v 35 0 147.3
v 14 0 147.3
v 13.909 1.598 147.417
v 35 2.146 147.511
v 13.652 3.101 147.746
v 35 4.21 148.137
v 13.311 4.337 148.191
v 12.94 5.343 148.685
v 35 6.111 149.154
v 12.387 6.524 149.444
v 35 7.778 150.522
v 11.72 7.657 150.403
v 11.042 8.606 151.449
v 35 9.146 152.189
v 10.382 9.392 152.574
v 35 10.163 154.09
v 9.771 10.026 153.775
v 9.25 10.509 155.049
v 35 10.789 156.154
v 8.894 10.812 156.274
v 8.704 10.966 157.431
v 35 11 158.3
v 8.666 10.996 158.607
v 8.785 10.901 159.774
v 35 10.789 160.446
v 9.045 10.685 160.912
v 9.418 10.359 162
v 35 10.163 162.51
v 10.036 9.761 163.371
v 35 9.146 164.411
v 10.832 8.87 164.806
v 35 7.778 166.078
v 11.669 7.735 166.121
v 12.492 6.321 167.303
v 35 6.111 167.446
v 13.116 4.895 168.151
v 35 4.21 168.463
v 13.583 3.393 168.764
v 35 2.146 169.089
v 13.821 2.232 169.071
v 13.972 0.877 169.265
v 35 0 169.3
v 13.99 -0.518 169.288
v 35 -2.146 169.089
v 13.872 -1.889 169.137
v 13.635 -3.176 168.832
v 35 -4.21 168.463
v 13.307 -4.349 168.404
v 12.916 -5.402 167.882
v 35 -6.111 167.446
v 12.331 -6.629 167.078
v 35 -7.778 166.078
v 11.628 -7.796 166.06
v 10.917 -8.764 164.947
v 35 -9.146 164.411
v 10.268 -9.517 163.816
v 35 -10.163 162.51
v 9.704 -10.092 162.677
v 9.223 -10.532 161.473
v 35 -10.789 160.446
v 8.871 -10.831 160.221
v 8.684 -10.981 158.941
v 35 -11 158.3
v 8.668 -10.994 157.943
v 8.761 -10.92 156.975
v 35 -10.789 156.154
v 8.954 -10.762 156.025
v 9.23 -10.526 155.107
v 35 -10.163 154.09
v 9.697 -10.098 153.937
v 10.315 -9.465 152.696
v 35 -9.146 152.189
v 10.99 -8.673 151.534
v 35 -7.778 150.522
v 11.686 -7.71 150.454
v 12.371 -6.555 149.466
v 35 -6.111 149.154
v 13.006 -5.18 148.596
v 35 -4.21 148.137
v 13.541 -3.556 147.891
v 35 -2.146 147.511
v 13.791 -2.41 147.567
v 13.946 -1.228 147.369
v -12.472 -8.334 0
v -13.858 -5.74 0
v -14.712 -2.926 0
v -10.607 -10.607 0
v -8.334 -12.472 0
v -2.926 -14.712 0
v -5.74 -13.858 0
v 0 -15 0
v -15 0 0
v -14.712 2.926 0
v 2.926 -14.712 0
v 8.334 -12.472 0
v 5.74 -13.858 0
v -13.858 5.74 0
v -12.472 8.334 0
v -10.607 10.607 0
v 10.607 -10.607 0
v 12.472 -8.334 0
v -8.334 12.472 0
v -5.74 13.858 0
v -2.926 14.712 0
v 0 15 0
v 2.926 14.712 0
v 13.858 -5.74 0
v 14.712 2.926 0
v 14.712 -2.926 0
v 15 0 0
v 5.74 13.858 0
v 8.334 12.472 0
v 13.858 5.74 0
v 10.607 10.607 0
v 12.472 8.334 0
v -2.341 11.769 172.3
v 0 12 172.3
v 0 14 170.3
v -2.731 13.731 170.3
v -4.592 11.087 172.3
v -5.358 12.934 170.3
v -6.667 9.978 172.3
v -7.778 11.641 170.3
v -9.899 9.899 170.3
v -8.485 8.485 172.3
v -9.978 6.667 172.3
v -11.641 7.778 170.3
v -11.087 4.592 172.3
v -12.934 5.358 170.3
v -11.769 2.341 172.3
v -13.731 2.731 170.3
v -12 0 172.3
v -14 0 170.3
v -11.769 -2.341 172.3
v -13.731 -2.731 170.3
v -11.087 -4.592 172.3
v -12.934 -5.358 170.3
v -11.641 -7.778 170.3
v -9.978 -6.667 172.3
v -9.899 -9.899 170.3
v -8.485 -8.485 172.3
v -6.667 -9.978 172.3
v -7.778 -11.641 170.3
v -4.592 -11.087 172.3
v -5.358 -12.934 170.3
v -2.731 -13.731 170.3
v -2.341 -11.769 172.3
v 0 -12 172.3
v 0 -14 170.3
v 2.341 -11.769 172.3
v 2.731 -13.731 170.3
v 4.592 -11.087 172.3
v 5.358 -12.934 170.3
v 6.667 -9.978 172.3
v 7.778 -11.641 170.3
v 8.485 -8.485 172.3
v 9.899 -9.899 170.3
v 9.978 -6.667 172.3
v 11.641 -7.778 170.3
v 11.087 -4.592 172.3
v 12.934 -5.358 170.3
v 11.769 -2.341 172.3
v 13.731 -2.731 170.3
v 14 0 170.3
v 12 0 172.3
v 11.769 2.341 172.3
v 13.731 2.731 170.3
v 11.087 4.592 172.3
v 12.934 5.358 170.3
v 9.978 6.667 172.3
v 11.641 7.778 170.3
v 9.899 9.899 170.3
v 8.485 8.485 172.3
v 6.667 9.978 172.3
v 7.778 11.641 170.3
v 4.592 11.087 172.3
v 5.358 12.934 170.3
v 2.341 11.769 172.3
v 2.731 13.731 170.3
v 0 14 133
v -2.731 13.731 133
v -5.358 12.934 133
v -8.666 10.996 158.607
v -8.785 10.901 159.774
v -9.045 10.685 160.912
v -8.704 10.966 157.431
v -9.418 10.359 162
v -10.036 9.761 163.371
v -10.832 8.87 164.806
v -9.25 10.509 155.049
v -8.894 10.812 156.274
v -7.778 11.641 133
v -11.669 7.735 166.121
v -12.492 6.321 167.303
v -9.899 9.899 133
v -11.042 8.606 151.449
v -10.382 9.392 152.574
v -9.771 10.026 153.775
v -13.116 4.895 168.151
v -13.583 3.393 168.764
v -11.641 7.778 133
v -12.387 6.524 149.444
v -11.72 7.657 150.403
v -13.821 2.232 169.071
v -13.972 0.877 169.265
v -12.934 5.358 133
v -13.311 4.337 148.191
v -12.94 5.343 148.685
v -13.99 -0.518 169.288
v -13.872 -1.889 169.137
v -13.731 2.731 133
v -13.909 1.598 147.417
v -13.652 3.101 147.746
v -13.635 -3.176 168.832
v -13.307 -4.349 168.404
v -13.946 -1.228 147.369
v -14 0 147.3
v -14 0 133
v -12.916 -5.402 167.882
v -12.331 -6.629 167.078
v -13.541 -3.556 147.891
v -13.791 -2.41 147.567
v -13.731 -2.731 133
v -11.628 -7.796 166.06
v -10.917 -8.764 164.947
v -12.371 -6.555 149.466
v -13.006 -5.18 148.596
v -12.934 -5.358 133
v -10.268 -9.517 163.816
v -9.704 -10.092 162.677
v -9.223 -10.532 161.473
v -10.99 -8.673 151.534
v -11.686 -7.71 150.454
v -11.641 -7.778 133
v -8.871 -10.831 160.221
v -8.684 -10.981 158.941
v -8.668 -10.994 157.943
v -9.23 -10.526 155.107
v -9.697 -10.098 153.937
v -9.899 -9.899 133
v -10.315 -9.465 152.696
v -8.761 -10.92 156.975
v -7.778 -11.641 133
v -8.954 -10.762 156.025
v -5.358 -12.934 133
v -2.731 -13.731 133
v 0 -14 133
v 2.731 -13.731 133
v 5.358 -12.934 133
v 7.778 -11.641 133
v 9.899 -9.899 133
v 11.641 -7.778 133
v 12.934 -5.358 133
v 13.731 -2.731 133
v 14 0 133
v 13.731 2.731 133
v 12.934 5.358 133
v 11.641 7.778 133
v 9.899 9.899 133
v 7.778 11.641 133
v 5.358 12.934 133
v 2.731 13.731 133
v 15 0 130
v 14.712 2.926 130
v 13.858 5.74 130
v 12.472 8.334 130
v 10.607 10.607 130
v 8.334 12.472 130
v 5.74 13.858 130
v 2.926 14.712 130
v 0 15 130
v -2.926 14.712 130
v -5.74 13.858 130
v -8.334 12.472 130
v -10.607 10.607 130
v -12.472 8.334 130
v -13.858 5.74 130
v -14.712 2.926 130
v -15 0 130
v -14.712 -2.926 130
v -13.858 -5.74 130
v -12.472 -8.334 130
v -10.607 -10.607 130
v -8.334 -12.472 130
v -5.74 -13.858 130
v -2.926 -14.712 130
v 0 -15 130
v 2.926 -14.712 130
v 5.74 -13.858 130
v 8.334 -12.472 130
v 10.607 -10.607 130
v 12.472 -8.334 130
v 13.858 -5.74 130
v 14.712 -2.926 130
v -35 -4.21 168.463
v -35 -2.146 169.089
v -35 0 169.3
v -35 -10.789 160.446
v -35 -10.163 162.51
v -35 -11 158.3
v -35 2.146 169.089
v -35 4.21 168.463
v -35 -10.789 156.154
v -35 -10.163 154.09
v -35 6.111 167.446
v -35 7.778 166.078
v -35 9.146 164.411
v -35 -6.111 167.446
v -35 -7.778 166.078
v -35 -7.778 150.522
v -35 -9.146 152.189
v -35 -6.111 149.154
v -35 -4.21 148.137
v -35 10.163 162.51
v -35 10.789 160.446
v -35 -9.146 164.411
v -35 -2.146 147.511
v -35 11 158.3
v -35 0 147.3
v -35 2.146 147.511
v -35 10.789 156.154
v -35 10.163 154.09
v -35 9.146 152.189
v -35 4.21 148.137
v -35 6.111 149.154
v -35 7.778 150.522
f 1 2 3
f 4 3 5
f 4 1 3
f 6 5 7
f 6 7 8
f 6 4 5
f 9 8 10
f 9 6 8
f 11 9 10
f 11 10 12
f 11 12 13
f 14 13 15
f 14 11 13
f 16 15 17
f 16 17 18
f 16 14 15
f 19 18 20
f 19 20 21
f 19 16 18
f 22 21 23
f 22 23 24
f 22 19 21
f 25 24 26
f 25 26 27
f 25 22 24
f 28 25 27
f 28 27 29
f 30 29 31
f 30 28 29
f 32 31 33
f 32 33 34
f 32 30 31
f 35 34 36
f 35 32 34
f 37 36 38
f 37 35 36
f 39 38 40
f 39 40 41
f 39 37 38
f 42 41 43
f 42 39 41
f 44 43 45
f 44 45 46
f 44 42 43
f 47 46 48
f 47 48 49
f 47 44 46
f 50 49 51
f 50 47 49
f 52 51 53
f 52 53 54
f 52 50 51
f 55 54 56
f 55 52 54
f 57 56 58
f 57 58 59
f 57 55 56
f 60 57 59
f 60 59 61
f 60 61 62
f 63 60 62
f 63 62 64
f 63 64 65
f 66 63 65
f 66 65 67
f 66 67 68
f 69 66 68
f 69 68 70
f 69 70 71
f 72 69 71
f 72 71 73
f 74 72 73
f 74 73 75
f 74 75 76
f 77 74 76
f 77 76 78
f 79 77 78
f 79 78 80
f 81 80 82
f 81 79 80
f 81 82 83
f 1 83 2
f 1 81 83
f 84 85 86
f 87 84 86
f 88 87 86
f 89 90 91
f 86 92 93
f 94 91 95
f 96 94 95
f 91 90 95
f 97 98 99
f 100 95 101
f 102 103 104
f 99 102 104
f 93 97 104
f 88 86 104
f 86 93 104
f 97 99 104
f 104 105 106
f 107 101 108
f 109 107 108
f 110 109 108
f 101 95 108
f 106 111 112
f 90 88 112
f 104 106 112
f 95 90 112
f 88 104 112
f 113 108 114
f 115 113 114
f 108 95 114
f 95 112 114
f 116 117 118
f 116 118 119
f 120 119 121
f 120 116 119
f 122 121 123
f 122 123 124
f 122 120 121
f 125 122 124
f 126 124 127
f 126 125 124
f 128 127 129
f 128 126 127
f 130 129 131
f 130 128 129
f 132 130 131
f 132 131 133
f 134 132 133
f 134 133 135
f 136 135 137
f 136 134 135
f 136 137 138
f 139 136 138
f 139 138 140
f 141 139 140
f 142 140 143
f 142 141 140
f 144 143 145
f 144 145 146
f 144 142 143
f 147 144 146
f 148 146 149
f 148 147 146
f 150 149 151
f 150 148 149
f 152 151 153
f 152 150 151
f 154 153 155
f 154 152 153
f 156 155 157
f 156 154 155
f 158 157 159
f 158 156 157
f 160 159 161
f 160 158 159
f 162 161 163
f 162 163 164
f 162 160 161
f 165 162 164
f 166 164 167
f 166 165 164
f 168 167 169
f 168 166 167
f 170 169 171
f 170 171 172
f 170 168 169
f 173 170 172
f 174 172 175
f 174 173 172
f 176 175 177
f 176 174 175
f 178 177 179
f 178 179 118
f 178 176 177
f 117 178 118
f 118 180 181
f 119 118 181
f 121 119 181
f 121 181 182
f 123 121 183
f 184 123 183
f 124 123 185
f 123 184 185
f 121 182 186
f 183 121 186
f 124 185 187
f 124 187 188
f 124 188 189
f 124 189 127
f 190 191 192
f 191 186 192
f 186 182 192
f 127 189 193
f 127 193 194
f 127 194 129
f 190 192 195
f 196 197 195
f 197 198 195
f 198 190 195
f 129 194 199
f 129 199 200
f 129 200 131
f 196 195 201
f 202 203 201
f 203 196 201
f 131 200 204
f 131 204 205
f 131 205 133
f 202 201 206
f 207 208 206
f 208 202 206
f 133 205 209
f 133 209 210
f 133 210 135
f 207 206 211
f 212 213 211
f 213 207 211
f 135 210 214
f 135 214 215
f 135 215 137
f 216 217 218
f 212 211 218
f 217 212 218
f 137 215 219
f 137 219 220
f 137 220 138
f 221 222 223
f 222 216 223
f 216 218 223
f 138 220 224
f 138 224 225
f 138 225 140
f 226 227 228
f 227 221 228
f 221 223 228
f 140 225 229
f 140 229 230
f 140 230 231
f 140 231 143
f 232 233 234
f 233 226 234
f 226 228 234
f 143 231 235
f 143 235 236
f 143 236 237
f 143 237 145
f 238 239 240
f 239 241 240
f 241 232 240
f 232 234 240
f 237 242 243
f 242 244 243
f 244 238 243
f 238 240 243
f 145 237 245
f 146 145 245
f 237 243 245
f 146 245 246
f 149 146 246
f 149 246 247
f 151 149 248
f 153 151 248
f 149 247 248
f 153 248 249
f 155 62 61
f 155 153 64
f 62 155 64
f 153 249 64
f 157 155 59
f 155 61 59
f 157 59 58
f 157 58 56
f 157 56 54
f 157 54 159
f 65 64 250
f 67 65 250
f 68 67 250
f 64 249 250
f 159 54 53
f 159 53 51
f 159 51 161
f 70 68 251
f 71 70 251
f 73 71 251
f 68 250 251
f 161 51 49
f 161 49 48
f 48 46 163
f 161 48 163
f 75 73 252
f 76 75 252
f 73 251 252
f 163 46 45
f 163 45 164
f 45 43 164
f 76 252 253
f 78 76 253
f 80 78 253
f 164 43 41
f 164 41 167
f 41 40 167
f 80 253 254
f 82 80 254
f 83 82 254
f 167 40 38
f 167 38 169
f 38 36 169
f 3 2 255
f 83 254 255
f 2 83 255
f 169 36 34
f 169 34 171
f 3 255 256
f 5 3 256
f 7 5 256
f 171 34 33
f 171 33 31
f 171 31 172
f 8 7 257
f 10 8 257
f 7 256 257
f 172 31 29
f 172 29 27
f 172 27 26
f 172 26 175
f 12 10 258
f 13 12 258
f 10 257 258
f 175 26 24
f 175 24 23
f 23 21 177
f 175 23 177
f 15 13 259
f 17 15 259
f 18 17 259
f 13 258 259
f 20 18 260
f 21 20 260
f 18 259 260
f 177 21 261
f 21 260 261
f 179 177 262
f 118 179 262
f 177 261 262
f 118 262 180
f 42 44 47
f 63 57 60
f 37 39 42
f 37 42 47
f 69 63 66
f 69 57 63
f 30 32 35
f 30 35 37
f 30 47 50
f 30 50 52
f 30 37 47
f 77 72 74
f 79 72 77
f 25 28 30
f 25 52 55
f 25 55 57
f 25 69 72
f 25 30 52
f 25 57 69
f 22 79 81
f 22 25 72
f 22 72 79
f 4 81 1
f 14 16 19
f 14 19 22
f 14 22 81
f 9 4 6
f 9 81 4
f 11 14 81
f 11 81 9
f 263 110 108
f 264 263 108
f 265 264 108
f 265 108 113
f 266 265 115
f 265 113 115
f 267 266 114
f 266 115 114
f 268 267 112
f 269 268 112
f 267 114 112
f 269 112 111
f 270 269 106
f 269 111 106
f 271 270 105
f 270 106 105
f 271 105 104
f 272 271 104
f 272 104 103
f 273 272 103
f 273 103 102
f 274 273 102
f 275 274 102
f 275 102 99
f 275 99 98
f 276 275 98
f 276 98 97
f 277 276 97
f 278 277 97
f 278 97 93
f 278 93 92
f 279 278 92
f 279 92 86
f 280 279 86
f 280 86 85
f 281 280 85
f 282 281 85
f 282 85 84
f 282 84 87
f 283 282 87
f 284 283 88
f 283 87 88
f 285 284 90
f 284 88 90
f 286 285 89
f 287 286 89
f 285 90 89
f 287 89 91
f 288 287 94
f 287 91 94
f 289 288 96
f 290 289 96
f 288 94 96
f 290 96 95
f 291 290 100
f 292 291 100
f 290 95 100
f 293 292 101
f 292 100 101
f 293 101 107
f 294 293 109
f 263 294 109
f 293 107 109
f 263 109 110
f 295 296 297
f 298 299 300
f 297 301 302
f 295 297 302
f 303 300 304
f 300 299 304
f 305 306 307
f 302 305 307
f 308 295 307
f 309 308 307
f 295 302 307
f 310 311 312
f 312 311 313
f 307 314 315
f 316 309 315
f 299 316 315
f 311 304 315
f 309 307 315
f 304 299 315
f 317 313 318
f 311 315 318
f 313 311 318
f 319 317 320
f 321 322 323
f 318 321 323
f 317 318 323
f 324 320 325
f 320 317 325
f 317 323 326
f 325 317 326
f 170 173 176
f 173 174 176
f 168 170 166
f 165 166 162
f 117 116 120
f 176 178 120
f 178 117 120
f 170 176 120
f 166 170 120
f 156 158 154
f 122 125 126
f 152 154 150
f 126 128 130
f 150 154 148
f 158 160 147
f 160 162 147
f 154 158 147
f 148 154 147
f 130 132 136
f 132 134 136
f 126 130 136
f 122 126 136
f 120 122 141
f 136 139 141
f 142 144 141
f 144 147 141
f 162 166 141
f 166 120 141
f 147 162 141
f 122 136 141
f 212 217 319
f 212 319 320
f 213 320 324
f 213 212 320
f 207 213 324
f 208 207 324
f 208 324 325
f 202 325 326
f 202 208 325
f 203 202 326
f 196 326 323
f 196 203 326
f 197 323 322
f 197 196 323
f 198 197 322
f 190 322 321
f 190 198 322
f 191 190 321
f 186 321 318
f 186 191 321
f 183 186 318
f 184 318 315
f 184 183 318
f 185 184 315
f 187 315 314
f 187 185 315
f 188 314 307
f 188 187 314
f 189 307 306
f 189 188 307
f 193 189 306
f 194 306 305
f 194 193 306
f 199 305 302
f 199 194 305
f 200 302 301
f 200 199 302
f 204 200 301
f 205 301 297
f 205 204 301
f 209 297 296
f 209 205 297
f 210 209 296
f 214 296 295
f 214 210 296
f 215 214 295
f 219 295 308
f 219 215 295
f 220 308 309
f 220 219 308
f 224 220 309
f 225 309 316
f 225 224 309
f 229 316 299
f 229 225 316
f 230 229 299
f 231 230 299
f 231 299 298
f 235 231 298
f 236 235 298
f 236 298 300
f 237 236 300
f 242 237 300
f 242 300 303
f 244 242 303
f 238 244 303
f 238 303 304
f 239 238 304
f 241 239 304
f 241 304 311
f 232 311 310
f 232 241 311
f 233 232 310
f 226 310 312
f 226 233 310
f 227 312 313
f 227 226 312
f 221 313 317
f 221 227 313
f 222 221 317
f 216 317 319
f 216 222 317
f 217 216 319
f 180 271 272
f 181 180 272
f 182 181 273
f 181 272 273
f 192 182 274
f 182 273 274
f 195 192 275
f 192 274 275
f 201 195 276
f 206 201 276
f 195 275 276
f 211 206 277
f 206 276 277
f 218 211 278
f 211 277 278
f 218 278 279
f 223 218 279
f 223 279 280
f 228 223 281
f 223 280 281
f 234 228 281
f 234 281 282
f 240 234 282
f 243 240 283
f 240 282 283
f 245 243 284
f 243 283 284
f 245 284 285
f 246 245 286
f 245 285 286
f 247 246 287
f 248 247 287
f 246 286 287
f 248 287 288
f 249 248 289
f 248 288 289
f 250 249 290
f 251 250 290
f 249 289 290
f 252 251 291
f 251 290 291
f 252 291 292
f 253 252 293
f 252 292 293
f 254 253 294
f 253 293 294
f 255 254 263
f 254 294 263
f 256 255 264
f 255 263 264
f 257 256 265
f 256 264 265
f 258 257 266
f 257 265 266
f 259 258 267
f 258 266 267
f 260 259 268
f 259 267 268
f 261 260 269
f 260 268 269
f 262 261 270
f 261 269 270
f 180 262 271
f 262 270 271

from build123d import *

# Parameters (mm, degrees)
SKETCH2_R           = 15
BOSS_EXTRUDE2_DEPTH = 130
SKETCH5_R           = 11
BOSS_EXTRUDE3_DEPTH = 35
CHAMFER1_SIZE       = 2


with BuildPart() as part:
    # Sketch2 → Boss-Extrude2 (new body)
    with BuildSketch(Plane.XY):
        Circle(SKETCH2_R)
    extrude(amount=BOSS_EXTRUDE2_DEPTH)

    # Sketch4 → Revolve1 (revolve)
    with BuildSketch(Plane(origin=(0, 0, 0), x_dir=(0, 0, -1), z_dir=(1, 0, 0))):
        Polygon((-130, 0), (-172.3, 0), (-172.3, 14), (-133, 14), (-130, 15), align=None)
    revolve(axis=Axis((0, 0, 130), (0, 0, 1)))

    # Sketch5 → Boss-Extrude3 (add, symmetric)
    with BuildSketch(Plane(origin=(0, 0, 0), x_dir=(0, 0, -1), z_dir=(1, 0, 0))):
        with Locations((-158.3, 0)):
            Circle(SKETCH5_R)
    extrude(amount=BOSS_EXTRUDE3_DEPTH, both=True)

    # Chamfer1
    chamfer1_edges = [part.edges().sort_by_distance(p)[0] for p in [
        (0, -14, 172.3),
    ]]
    chamfer(chamfer1_edges, length=CHAMFER1_SIZE)


solid = part.part
